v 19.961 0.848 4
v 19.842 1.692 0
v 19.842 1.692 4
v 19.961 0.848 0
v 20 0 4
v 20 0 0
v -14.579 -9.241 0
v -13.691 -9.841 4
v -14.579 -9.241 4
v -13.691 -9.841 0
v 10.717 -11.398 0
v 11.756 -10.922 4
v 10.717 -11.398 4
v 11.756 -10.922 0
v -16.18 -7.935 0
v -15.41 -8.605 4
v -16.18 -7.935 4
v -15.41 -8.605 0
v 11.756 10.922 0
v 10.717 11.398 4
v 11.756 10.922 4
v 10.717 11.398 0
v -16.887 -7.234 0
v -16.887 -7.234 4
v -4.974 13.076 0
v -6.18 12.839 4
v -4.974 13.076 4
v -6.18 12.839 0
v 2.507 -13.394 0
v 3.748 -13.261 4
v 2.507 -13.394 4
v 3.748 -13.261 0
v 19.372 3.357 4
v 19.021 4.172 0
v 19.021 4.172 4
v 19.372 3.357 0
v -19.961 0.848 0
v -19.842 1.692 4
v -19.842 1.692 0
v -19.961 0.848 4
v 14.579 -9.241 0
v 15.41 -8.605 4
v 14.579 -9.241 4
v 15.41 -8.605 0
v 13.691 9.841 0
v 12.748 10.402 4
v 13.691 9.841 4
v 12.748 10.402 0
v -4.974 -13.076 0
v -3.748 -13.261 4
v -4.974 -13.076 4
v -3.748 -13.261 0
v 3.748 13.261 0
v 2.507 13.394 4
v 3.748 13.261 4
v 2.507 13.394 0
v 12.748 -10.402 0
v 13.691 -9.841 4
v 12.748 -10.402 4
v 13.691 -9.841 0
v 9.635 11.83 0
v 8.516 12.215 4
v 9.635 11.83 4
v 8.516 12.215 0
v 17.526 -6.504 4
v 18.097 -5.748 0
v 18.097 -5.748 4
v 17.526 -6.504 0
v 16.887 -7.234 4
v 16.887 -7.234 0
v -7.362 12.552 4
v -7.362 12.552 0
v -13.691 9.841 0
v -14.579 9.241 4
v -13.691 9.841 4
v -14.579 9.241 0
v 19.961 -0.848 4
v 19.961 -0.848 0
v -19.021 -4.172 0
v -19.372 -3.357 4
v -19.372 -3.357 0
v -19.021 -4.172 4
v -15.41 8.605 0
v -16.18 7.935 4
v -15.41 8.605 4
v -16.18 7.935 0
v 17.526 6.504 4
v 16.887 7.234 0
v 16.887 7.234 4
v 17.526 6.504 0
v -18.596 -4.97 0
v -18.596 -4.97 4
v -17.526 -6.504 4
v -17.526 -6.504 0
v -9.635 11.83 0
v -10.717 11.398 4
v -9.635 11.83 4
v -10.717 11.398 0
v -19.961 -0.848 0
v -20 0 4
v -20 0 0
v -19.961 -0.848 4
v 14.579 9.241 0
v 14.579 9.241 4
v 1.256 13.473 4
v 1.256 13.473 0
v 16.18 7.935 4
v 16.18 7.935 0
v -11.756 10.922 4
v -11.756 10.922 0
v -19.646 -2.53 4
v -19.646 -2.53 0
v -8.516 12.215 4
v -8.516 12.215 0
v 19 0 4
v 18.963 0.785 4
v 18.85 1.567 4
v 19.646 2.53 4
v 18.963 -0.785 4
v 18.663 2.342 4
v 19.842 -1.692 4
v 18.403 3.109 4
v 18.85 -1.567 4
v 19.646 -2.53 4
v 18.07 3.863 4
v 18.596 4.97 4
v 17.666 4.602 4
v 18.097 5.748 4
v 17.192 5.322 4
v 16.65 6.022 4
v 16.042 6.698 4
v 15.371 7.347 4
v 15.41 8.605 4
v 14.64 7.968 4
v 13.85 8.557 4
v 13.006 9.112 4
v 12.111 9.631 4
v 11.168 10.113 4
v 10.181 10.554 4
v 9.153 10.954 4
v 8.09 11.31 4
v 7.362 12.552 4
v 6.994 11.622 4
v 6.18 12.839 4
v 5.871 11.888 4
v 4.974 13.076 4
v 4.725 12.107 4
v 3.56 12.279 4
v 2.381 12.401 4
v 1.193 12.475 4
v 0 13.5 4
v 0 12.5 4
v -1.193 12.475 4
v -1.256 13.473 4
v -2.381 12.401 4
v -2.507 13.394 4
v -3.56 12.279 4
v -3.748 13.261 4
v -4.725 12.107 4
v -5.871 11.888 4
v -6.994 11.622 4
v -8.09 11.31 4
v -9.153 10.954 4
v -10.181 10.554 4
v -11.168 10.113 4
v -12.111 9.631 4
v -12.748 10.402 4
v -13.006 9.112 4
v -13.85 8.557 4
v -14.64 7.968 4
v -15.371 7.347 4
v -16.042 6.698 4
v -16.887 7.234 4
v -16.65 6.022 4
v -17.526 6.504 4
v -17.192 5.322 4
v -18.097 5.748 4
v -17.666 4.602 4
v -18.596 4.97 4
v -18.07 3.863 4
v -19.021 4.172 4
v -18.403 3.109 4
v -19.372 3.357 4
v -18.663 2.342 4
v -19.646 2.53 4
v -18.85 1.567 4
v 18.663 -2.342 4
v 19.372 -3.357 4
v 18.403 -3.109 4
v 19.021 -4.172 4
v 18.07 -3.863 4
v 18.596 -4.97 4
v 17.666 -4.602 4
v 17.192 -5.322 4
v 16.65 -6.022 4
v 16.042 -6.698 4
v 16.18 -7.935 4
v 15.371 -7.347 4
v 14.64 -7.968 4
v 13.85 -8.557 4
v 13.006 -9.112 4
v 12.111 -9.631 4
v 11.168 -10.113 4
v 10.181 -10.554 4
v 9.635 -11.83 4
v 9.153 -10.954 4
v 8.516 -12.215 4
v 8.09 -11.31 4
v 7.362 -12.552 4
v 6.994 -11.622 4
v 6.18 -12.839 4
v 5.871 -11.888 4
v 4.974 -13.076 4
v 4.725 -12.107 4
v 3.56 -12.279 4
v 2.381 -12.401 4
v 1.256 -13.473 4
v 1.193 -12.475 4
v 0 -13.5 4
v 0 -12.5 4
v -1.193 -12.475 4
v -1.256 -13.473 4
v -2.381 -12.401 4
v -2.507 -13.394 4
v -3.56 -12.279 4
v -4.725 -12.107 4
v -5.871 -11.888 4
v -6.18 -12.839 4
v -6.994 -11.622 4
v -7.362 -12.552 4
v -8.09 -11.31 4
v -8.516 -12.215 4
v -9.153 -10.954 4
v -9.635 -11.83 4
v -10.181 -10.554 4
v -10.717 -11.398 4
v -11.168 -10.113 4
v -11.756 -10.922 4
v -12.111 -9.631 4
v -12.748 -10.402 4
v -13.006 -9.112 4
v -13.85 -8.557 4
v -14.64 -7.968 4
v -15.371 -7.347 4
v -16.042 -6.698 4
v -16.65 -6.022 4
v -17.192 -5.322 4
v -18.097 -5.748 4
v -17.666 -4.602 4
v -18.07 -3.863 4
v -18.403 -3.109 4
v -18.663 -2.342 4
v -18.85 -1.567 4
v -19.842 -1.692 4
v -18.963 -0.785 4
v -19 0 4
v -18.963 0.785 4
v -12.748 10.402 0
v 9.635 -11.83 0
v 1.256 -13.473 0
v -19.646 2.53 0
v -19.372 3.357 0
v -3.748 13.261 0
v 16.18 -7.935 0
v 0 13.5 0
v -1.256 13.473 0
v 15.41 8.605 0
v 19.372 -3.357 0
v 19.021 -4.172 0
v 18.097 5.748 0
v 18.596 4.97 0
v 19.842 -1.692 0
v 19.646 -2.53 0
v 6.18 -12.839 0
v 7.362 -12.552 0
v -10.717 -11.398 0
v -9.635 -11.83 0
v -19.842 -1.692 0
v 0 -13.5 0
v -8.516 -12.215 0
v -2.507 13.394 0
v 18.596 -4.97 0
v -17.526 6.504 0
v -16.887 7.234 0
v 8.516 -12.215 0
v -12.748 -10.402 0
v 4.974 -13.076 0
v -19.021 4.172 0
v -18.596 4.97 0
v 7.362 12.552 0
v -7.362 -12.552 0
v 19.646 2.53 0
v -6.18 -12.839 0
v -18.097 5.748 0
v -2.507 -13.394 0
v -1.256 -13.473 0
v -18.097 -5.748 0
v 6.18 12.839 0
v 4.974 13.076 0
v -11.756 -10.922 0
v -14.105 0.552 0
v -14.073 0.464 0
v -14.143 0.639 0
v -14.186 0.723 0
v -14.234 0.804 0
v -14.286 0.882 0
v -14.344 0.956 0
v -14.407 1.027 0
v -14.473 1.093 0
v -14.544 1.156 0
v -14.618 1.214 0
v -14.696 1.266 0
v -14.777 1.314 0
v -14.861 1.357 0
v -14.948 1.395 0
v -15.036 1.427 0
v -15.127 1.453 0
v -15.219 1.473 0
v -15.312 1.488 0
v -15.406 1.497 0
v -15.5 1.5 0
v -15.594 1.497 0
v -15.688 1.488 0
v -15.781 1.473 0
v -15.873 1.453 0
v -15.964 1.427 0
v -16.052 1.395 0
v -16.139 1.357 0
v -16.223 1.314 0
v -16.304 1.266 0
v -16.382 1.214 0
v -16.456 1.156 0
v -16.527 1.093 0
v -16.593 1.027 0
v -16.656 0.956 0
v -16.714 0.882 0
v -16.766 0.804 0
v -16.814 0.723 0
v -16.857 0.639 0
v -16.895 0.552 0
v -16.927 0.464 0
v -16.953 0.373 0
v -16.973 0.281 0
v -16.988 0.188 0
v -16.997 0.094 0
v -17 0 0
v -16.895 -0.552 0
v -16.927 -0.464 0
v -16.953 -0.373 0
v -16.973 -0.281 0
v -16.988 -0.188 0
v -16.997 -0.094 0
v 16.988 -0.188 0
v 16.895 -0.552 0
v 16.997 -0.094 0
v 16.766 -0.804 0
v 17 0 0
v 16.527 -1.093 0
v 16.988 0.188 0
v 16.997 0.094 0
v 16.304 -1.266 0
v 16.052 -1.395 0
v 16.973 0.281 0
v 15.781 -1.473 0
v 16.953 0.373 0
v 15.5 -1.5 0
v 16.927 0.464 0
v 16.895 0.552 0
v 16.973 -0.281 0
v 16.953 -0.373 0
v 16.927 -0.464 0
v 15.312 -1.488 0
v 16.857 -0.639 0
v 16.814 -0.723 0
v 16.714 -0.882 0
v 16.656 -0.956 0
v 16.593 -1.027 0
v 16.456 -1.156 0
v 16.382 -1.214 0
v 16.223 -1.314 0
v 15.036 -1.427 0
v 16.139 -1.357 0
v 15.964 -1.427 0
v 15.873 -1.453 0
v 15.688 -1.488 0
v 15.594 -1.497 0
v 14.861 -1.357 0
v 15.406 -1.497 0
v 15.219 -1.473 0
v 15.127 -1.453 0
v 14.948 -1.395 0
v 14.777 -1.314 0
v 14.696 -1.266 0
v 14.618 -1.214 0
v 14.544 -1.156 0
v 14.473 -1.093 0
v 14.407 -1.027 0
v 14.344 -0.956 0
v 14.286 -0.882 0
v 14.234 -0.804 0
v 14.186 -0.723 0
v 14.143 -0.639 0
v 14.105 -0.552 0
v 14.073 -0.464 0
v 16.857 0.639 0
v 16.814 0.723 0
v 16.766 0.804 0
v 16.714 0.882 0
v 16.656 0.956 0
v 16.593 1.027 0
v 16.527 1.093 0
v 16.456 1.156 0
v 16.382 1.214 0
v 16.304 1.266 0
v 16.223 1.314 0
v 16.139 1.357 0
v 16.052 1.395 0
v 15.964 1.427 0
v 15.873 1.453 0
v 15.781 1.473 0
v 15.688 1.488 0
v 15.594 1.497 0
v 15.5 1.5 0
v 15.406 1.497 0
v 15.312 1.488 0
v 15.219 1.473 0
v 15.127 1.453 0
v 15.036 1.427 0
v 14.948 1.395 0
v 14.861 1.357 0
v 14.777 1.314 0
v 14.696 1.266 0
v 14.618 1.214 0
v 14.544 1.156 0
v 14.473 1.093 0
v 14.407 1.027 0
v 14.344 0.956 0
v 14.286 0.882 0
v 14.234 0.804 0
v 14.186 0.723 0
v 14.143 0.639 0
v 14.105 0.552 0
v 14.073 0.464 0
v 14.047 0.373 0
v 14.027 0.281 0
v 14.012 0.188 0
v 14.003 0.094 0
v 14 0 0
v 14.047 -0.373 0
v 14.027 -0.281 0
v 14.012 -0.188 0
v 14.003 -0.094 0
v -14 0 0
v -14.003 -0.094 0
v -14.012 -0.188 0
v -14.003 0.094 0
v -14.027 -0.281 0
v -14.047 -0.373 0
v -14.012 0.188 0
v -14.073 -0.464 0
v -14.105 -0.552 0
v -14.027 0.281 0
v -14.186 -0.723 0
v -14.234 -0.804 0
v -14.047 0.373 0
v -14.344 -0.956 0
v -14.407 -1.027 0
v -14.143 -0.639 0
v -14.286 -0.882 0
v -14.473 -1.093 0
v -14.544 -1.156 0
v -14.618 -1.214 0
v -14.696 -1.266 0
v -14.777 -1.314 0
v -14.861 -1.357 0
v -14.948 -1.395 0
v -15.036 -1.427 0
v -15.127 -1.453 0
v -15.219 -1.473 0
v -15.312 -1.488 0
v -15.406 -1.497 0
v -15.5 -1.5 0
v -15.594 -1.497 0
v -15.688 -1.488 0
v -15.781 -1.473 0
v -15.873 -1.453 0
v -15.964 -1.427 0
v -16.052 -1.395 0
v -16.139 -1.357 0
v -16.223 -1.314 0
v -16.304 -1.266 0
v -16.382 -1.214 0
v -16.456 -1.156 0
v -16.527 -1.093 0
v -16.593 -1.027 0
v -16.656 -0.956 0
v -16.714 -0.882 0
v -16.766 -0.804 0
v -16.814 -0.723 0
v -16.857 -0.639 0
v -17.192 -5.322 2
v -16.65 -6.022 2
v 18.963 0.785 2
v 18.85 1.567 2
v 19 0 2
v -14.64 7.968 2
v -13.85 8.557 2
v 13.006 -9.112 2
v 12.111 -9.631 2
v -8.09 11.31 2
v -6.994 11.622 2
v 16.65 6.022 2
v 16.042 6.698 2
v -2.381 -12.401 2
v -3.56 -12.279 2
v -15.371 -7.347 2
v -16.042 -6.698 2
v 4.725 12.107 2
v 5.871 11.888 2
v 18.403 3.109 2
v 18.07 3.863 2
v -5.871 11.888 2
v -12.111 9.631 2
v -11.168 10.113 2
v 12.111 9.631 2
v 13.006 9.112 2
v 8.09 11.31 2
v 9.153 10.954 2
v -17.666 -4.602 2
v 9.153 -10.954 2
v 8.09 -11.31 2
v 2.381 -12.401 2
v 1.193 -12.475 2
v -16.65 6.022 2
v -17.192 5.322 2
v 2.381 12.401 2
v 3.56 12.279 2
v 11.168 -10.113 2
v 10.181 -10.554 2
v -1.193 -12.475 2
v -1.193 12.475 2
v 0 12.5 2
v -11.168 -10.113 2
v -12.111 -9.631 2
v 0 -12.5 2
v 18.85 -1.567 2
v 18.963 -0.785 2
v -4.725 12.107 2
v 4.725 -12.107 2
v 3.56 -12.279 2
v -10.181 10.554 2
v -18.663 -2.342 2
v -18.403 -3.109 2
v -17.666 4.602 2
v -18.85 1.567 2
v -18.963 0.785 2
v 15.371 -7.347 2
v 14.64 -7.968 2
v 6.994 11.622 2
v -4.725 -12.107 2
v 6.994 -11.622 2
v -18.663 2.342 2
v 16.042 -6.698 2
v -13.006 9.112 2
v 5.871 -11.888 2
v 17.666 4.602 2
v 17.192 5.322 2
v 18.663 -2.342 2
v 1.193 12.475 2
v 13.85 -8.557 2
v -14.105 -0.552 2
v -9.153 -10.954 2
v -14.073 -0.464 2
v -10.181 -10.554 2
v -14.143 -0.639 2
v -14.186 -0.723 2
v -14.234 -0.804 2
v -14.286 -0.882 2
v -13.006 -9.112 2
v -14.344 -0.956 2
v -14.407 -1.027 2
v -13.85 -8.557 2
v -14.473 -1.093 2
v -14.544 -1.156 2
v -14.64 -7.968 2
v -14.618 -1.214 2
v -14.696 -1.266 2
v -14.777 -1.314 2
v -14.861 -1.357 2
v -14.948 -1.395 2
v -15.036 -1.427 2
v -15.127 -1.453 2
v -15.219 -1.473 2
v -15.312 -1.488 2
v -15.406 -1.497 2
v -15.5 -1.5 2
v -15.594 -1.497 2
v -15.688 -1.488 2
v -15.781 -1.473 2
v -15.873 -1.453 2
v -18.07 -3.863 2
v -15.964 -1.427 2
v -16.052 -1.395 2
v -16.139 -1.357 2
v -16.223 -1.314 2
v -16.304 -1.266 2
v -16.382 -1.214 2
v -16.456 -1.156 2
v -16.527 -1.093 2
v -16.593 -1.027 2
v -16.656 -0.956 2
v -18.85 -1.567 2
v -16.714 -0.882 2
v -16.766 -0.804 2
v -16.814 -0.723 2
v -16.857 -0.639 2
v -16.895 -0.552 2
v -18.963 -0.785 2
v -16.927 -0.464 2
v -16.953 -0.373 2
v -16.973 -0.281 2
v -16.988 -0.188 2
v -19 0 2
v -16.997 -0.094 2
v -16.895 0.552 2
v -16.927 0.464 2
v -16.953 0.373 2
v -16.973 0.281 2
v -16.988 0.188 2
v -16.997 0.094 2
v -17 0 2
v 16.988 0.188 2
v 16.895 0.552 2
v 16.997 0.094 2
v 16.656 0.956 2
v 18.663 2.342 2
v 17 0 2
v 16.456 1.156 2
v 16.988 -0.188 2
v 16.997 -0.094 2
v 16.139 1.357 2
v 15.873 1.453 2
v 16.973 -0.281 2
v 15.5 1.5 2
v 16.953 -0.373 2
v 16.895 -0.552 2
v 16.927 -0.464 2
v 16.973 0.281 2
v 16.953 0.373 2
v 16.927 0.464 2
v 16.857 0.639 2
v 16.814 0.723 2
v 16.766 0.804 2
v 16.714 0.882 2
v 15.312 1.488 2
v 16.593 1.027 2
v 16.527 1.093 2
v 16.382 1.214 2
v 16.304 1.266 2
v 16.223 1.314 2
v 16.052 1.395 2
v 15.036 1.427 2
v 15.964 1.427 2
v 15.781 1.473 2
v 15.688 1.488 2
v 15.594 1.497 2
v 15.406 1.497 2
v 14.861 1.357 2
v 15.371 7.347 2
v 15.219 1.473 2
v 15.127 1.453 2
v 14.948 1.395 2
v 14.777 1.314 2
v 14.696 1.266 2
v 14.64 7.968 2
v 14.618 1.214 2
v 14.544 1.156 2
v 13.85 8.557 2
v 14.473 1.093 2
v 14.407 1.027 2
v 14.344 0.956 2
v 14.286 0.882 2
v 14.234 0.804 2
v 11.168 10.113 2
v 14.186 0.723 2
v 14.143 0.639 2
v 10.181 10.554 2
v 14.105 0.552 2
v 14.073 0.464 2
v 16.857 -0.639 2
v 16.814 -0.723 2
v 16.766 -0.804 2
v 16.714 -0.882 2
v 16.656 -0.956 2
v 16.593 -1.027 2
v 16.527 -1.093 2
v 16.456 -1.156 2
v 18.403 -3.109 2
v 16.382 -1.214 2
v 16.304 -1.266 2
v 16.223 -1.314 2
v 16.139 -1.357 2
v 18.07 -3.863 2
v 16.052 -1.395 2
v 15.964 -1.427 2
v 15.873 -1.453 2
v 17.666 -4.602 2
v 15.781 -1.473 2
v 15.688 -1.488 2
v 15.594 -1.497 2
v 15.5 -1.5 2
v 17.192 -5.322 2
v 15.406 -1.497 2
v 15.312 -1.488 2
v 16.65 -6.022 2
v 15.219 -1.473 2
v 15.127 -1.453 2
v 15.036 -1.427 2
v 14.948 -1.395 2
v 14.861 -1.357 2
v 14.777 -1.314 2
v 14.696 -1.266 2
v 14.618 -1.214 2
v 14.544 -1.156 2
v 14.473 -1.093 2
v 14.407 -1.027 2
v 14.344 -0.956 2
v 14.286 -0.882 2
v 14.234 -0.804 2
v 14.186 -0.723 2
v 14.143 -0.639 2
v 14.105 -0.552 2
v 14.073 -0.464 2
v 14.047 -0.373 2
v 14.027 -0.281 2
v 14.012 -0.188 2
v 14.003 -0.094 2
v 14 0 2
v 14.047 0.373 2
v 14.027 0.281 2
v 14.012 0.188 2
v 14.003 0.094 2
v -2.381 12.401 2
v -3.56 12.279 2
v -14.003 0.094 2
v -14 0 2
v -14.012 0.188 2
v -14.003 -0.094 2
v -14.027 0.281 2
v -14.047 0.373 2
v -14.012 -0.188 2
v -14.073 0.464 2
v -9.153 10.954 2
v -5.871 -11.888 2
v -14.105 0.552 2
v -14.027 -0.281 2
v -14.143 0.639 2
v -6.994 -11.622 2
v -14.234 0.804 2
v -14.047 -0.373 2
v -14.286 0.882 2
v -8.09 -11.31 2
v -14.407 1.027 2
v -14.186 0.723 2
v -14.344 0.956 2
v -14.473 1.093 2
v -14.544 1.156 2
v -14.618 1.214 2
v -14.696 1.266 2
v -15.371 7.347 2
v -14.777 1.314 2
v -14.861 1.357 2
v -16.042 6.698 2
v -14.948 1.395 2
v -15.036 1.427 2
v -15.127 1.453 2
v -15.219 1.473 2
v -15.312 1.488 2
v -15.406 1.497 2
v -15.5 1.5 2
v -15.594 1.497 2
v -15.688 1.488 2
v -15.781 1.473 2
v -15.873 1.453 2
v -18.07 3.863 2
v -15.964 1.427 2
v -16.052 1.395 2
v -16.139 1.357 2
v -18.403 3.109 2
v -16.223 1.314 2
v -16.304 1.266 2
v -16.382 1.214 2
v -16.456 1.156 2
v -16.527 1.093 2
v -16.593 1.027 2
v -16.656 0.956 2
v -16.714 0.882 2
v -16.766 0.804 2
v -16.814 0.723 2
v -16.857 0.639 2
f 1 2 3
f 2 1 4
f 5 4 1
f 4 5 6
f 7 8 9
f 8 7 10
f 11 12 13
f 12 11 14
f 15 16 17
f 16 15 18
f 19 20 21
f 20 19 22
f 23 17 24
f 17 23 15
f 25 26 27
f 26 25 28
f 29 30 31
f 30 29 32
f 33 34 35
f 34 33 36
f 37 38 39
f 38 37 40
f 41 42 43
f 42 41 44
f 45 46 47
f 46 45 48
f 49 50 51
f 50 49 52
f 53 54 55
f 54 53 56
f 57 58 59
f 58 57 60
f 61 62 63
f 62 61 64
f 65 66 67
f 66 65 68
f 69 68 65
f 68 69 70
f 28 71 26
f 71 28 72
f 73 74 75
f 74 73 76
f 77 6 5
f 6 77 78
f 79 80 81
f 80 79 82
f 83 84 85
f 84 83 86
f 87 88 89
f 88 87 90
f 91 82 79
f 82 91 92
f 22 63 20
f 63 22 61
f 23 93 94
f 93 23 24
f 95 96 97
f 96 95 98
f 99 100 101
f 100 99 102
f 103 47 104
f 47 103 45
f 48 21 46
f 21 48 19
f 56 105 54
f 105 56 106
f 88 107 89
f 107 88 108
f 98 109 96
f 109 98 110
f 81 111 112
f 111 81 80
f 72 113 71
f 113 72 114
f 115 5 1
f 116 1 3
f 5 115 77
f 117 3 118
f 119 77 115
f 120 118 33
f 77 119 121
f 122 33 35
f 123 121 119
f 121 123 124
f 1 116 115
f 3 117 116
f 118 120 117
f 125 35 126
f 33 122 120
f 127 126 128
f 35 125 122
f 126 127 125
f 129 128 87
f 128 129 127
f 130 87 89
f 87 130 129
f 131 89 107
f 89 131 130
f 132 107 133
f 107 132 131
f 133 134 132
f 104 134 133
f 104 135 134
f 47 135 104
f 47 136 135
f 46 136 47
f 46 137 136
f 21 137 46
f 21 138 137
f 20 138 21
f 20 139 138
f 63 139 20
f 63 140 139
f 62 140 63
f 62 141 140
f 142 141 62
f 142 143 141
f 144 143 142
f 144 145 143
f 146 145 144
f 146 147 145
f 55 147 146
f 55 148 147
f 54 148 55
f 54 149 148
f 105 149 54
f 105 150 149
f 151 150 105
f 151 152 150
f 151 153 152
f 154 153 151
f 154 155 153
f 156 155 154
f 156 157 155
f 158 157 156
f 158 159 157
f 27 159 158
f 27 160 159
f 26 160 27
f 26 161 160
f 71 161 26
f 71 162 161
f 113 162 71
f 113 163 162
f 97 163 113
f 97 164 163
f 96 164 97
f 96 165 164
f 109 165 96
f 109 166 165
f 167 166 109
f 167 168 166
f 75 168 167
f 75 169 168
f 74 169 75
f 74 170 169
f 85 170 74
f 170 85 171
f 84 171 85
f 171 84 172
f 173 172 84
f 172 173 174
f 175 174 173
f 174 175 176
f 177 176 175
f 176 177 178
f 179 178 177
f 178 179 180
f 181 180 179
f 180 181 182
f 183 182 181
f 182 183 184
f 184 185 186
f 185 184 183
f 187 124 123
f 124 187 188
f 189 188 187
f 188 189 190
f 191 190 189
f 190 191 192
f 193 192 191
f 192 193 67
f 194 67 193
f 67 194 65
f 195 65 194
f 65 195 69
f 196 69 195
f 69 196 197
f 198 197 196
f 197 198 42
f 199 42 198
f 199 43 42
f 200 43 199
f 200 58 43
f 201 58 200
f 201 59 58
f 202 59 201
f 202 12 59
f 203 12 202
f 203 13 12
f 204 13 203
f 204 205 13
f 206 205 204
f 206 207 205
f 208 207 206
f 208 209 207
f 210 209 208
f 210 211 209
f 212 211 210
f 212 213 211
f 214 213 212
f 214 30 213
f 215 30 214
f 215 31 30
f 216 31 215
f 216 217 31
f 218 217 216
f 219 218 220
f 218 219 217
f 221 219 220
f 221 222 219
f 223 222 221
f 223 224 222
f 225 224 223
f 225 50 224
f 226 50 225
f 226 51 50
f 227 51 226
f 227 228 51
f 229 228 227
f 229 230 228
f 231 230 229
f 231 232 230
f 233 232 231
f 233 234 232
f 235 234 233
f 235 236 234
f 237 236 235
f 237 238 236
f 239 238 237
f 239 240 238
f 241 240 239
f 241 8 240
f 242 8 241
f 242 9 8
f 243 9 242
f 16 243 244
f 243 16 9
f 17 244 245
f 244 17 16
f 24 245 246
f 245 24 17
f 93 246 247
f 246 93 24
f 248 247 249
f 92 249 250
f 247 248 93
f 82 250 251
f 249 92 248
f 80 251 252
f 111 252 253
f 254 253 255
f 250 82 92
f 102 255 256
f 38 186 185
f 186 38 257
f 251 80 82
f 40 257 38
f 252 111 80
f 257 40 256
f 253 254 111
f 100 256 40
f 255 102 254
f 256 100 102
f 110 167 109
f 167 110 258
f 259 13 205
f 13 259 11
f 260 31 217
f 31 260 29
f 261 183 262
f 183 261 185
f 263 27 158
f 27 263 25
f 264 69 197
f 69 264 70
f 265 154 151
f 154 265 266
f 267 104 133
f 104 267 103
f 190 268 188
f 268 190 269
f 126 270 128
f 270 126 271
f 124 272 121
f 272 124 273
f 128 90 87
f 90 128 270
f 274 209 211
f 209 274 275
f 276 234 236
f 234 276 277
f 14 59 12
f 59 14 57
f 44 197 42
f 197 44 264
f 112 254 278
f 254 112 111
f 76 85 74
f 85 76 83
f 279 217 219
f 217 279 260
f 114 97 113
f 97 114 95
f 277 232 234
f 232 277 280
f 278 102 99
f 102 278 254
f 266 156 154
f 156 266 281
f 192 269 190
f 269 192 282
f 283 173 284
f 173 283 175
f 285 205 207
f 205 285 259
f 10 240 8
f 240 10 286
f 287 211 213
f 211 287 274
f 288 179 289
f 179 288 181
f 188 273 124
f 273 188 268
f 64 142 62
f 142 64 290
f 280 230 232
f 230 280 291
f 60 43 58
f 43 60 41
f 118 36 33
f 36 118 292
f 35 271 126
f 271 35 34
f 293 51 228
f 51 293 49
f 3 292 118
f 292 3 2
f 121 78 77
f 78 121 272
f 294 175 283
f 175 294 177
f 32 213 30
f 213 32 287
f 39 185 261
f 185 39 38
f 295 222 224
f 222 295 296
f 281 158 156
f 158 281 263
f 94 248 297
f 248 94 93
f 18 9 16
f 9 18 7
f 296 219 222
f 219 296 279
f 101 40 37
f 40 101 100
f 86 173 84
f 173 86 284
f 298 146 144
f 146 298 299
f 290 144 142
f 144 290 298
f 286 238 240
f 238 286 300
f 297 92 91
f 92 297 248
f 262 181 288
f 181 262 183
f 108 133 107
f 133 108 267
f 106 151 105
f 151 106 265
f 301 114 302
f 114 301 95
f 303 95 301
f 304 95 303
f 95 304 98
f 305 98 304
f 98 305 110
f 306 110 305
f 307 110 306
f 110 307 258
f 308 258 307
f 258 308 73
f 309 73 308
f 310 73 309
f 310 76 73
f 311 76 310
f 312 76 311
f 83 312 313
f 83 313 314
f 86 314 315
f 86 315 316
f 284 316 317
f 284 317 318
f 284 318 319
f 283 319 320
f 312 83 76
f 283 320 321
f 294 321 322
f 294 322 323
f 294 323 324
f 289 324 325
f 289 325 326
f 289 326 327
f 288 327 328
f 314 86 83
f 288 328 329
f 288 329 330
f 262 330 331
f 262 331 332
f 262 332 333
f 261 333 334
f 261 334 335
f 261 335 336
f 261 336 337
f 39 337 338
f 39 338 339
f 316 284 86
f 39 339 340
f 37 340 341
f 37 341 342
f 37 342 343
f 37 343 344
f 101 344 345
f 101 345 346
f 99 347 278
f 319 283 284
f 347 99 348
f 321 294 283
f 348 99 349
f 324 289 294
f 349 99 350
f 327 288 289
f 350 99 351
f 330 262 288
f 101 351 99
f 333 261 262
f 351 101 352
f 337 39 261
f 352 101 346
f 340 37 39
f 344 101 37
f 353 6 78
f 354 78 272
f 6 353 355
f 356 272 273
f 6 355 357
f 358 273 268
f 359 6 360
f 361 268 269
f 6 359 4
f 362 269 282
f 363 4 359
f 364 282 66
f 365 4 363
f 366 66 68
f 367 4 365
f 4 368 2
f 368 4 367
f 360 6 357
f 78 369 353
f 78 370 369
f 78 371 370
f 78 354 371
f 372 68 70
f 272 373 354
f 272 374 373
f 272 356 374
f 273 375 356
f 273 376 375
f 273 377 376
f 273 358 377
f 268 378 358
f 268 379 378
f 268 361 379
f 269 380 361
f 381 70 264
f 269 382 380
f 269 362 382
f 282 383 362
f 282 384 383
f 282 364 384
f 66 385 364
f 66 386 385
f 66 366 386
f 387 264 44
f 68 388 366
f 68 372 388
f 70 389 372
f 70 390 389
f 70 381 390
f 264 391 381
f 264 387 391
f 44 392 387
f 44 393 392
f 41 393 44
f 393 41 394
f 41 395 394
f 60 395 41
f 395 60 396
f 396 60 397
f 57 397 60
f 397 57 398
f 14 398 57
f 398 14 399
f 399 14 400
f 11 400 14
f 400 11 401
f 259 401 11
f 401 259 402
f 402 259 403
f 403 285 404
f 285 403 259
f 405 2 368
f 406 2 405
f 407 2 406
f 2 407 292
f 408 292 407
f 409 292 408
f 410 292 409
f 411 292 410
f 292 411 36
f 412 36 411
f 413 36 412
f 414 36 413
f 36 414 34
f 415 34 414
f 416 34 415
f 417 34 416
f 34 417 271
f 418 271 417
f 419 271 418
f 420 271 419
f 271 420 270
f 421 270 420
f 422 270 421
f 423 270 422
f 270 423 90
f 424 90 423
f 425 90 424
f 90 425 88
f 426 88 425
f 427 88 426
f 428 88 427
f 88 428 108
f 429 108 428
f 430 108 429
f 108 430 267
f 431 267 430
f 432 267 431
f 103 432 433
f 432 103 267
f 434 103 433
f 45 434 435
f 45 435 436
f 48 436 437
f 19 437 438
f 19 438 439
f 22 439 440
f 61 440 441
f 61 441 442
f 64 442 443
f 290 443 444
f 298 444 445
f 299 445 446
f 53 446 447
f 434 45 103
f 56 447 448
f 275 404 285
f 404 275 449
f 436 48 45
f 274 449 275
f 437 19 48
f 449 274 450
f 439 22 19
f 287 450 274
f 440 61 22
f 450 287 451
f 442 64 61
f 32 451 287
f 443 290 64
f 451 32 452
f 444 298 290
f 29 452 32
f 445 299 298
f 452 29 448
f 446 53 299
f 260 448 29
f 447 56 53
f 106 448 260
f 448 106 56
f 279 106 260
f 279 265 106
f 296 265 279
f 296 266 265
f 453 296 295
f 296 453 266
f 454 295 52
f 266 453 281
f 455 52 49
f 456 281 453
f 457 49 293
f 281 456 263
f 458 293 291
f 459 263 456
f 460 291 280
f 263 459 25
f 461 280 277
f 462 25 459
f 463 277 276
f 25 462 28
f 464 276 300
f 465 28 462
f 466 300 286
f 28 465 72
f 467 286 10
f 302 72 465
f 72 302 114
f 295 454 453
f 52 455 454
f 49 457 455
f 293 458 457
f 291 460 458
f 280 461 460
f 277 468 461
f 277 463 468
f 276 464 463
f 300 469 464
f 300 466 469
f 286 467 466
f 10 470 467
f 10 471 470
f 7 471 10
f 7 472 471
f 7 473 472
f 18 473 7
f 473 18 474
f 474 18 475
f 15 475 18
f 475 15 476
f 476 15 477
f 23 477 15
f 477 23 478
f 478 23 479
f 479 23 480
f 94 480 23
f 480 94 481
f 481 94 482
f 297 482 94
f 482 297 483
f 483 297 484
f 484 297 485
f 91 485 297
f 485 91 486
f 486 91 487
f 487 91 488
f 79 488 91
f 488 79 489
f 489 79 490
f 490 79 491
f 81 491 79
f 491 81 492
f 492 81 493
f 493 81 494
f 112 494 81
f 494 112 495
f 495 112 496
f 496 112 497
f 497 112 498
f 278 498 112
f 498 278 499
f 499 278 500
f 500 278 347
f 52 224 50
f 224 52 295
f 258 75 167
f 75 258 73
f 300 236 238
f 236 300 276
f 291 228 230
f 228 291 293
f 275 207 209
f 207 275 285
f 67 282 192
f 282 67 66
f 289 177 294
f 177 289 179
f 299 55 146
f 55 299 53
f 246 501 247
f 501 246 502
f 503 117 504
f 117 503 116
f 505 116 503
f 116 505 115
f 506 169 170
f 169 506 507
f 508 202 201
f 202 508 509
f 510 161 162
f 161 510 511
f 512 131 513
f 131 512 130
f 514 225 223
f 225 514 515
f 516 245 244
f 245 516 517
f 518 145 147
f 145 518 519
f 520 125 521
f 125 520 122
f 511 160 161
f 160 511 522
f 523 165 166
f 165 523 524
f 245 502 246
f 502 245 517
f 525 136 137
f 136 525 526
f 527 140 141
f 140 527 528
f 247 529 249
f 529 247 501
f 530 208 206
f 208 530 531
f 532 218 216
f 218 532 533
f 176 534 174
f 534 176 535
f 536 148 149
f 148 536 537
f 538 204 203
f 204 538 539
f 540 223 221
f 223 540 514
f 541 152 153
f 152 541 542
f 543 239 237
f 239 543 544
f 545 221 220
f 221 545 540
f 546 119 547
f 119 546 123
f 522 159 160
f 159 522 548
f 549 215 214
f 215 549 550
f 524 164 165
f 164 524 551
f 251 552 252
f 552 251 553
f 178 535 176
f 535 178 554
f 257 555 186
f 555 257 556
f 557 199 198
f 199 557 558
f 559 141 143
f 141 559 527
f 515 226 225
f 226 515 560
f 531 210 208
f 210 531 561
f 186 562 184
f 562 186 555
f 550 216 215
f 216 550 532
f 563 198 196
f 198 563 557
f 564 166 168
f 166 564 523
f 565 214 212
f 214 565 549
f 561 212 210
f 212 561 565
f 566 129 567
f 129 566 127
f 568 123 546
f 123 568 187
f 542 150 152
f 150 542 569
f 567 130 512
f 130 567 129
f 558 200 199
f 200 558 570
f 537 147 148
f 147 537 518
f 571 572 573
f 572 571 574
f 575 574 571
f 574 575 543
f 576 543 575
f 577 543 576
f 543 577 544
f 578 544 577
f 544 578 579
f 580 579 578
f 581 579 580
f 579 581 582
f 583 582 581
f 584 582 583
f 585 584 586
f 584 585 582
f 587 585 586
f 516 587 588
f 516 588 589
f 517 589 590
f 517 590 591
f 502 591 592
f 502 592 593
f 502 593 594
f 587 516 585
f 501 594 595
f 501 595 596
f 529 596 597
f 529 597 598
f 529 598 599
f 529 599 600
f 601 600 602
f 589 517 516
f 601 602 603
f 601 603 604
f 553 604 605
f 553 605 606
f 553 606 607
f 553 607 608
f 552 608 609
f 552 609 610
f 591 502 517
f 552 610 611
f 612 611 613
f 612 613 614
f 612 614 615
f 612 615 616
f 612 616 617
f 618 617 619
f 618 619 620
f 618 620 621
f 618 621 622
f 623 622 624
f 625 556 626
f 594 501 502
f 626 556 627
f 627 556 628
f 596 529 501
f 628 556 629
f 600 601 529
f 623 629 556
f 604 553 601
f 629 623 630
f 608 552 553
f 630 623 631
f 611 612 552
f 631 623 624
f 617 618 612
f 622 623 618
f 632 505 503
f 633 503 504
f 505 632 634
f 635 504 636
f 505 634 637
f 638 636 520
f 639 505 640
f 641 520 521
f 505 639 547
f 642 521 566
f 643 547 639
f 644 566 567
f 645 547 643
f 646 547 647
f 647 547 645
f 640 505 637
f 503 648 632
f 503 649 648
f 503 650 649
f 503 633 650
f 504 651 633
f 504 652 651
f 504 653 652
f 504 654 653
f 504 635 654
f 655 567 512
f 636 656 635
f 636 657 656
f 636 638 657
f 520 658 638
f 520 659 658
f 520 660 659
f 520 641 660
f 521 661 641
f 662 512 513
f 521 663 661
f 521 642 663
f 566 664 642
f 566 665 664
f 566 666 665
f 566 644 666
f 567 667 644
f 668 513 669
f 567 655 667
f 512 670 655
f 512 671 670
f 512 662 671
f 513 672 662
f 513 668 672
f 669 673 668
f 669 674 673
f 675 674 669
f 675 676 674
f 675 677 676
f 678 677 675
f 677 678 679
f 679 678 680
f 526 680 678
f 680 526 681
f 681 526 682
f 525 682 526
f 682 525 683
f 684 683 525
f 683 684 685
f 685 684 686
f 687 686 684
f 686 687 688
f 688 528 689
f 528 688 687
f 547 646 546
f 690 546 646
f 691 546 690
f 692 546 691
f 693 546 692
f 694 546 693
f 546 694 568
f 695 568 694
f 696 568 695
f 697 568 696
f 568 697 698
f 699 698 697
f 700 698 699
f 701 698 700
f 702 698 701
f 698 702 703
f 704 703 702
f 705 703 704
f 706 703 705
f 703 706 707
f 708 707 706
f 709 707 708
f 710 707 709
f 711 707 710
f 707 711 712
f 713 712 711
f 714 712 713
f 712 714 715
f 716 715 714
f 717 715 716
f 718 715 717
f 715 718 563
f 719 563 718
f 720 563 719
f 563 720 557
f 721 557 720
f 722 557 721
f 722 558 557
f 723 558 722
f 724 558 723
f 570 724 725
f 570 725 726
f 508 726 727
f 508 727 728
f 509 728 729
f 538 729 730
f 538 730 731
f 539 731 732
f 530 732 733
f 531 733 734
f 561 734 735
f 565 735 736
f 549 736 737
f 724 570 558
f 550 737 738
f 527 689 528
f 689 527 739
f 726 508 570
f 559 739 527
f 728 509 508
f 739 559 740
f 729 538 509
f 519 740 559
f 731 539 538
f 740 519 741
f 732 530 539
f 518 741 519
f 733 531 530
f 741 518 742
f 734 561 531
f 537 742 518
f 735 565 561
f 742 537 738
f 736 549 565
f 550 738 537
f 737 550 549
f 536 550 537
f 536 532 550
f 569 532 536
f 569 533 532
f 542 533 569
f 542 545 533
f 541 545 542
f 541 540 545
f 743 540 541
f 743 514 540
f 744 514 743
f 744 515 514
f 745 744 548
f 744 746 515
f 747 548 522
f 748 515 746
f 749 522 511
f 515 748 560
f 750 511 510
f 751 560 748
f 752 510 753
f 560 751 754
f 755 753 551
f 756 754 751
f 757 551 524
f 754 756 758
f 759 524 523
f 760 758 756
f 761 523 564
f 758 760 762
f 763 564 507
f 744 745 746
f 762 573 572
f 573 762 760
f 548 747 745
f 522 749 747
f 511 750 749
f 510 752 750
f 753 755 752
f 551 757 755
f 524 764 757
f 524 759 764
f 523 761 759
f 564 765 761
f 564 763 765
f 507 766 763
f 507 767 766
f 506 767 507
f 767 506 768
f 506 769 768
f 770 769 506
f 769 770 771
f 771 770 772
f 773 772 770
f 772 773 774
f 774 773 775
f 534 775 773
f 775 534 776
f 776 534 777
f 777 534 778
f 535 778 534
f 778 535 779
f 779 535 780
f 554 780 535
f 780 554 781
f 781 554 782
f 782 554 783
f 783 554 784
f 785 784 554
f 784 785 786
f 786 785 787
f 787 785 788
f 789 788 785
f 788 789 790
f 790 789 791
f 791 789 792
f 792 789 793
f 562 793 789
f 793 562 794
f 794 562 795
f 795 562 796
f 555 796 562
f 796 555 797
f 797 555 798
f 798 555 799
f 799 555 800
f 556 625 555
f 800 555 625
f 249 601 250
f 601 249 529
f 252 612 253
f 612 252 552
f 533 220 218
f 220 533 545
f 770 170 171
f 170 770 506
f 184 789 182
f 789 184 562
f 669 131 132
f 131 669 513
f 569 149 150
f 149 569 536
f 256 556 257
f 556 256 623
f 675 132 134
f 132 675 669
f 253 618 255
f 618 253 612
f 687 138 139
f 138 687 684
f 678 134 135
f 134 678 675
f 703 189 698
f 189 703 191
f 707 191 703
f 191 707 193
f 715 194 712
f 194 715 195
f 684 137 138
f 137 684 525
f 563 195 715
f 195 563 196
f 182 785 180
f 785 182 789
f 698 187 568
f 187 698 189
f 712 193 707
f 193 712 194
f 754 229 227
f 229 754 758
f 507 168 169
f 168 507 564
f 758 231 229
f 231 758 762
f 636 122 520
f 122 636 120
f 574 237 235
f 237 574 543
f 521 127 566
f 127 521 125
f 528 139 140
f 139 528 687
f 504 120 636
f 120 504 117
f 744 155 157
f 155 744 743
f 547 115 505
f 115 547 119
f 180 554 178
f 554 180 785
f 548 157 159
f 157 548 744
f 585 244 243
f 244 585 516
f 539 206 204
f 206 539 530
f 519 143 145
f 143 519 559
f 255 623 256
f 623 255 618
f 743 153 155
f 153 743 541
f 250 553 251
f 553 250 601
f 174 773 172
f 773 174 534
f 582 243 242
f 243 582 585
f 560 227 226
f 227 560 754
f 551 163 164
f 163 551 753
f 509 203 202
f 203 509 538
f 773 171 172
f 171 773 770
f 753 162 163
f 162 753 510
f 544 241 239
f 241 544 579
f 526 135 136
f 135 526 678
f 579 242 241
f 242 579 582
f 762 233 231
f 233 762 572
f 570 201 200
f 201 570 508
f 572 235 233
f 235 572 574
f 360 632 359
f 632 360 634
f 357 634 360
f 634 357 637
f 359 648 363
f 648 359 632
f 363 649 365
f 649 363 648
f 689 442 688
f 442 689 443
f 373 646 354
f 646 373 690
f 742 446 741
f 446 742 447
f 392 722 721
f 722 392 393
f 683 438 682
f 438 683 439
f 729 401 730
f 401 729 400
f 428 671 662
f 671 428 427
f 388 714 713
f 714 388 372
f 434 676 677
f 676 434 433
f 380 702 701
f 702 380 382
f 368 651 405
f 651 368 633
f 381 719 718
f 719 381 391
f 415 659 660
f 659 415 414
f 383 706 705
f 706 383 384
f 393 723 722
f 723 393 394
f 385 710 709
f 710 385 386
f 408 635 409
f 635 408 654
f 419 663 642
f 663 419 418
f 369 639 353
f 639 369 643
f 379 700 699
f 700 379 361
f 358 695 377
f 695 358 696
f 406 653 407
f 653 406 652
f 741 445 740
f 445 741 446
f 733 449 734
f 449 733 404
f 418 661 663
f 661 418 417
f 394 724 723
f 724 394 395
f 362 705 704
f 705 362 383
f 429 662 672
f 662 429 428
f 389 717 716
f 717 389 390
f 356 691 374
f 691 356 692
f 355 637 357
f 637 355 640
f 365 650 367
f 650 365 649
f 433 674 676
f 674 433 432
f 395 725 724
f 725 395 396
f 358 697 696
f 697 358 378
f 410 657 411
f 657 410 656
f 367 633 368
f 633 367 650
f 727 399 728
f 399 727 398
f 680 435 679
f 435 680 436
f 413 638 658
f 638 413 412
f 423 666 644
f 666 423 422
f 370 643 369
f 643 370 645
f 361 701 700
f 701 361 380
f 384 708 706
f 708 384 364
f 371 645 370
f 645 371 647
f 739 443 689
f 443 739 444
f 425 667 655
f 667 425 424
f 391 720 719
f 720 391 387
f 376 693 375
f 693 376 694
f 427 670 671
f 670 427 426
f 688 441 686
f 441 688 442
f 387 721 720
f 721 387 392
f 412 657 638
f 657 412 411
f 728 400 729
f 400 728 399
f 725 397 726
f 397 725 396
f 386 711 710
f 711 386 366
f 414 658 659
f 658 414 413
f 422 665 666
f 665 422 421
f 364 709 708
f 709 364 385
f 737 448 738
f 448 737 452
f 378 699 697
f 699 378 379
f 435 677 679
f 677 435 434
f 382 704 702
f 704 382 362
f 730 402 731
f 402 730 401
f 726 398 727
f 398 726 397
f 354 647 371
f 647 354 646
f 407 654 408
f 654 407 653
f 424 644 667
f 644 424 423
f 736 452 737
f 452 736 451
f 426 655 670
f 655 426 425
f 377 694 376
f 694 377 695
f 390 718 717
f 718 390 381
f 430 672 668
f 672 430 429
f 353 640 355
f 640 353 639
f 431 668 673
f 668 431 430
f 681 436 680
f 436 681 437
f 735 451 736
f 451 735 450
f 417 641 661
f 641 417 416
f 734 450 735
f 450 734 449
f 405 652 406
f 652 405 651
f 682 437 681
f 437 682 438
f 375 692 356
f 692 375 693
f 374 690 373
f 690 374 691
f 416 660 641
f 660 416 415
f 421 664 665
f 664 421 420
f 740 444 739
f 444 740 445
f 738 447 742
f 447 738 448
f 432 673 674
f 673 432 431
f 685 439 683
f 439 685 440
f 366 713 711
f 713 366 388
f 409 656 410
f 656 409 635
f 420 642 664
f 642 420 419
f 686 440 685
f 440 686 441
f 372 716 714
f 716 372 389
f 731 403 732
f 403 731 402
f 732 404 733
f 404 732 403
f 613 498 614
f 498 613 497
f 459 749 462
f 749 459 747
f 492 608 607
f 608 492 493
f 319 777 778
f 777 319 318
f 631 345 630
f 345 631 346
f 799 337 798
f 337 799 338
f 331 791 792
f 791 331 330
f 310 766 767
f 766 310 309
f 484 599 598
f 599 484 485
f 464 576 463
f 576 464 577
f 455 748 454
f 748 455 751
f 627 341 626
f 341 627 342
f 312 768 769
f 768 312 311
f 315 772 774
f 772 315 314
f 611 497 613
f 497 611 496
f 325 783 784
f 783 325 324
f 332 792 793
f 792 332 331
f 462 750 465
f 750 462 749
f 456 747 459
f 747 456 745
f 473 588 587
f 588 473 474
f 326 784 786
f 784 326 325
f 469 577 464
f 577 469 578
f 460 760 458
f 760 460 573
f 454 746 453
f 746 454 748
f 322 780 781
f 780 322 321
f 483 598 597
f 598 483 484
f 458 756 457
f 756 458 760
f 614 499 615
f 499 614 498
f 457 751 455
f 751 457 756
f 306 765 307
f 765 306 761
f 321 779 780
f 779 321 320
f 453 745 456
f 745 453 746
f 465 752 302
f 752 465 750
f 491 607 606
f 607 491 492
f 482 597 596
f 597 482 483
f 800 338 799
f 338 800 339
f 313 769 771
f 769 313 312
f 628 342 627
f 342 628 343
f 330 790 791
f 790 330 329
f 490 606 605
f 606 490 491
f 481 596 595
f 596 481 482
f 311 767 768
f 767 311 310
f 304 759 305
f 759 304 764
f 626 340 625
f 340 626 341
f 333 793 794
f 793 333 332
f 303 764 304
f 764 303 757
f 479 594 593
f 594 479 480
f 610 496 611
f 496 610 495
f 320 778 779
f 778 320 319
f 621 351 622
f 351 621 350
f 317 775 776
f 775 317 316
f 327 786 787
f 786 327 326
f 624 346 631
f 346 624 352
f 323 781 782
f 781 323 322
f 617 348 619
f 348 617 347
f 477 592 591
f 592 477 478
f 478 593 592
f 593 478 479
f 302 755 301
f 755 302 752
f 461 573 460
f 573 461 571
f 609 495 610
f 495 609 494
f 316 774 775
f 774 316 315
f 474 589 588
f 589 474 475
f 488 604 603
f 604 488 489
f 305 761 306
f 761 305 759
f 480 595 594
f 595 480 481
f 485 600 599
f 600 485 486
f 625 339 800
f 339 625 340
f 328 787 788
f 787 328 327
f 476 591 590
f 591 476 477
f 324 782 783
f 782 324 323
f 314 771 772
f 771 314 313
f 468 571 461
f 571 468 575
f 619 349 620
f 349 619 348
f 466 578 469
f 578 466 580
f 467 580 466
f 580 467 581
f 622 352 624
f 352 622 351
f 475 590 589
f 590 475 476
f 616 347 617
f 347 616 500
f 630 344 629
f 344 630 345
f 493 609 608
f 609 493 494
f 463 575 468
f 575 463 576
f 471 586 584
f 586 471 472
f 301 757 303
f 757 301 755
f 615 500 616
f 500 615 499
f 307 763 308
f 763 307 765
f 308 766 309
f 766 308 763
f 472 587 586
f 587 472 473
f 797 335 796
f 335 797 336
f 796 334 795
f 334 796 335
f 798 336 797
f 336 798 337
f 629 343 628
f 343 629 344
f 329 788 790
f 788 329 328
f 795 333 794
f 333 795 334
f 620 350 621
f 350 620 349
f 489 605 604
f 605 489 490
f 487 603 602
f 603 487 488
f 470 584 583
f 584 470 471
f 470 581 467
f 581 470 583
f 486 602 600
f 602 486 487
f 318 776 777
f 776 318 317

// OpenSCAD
/** plaque deco */

$fn = 100;

module logo() {
	translate([-14,-8,0])
		linear_extrude(height = 4)
			scale ([0.25,0.25,1])
				import (file="logo.dxf");
}

module plaque(long, larg) {
	difference() {
		resize ([long, larg, 0])
			cylinder (d=40, h=4);
		translate([0,0,2])
			resize ([long-2, larg-2, 0])
				cylinder (d=40, h=4);
	}
}

module trous(diam, long, larg) {
	pos = long/2 - 1.5*diam;
	translate([pos, 0, -1]) cylinder (d=diam, h=4);
	translate([-pos, 0, -1]) cylinder (d=diam, h=4);
}

logo();
difference() {
	plaque(40, 27);
	trous (3, 40, 27);
}
